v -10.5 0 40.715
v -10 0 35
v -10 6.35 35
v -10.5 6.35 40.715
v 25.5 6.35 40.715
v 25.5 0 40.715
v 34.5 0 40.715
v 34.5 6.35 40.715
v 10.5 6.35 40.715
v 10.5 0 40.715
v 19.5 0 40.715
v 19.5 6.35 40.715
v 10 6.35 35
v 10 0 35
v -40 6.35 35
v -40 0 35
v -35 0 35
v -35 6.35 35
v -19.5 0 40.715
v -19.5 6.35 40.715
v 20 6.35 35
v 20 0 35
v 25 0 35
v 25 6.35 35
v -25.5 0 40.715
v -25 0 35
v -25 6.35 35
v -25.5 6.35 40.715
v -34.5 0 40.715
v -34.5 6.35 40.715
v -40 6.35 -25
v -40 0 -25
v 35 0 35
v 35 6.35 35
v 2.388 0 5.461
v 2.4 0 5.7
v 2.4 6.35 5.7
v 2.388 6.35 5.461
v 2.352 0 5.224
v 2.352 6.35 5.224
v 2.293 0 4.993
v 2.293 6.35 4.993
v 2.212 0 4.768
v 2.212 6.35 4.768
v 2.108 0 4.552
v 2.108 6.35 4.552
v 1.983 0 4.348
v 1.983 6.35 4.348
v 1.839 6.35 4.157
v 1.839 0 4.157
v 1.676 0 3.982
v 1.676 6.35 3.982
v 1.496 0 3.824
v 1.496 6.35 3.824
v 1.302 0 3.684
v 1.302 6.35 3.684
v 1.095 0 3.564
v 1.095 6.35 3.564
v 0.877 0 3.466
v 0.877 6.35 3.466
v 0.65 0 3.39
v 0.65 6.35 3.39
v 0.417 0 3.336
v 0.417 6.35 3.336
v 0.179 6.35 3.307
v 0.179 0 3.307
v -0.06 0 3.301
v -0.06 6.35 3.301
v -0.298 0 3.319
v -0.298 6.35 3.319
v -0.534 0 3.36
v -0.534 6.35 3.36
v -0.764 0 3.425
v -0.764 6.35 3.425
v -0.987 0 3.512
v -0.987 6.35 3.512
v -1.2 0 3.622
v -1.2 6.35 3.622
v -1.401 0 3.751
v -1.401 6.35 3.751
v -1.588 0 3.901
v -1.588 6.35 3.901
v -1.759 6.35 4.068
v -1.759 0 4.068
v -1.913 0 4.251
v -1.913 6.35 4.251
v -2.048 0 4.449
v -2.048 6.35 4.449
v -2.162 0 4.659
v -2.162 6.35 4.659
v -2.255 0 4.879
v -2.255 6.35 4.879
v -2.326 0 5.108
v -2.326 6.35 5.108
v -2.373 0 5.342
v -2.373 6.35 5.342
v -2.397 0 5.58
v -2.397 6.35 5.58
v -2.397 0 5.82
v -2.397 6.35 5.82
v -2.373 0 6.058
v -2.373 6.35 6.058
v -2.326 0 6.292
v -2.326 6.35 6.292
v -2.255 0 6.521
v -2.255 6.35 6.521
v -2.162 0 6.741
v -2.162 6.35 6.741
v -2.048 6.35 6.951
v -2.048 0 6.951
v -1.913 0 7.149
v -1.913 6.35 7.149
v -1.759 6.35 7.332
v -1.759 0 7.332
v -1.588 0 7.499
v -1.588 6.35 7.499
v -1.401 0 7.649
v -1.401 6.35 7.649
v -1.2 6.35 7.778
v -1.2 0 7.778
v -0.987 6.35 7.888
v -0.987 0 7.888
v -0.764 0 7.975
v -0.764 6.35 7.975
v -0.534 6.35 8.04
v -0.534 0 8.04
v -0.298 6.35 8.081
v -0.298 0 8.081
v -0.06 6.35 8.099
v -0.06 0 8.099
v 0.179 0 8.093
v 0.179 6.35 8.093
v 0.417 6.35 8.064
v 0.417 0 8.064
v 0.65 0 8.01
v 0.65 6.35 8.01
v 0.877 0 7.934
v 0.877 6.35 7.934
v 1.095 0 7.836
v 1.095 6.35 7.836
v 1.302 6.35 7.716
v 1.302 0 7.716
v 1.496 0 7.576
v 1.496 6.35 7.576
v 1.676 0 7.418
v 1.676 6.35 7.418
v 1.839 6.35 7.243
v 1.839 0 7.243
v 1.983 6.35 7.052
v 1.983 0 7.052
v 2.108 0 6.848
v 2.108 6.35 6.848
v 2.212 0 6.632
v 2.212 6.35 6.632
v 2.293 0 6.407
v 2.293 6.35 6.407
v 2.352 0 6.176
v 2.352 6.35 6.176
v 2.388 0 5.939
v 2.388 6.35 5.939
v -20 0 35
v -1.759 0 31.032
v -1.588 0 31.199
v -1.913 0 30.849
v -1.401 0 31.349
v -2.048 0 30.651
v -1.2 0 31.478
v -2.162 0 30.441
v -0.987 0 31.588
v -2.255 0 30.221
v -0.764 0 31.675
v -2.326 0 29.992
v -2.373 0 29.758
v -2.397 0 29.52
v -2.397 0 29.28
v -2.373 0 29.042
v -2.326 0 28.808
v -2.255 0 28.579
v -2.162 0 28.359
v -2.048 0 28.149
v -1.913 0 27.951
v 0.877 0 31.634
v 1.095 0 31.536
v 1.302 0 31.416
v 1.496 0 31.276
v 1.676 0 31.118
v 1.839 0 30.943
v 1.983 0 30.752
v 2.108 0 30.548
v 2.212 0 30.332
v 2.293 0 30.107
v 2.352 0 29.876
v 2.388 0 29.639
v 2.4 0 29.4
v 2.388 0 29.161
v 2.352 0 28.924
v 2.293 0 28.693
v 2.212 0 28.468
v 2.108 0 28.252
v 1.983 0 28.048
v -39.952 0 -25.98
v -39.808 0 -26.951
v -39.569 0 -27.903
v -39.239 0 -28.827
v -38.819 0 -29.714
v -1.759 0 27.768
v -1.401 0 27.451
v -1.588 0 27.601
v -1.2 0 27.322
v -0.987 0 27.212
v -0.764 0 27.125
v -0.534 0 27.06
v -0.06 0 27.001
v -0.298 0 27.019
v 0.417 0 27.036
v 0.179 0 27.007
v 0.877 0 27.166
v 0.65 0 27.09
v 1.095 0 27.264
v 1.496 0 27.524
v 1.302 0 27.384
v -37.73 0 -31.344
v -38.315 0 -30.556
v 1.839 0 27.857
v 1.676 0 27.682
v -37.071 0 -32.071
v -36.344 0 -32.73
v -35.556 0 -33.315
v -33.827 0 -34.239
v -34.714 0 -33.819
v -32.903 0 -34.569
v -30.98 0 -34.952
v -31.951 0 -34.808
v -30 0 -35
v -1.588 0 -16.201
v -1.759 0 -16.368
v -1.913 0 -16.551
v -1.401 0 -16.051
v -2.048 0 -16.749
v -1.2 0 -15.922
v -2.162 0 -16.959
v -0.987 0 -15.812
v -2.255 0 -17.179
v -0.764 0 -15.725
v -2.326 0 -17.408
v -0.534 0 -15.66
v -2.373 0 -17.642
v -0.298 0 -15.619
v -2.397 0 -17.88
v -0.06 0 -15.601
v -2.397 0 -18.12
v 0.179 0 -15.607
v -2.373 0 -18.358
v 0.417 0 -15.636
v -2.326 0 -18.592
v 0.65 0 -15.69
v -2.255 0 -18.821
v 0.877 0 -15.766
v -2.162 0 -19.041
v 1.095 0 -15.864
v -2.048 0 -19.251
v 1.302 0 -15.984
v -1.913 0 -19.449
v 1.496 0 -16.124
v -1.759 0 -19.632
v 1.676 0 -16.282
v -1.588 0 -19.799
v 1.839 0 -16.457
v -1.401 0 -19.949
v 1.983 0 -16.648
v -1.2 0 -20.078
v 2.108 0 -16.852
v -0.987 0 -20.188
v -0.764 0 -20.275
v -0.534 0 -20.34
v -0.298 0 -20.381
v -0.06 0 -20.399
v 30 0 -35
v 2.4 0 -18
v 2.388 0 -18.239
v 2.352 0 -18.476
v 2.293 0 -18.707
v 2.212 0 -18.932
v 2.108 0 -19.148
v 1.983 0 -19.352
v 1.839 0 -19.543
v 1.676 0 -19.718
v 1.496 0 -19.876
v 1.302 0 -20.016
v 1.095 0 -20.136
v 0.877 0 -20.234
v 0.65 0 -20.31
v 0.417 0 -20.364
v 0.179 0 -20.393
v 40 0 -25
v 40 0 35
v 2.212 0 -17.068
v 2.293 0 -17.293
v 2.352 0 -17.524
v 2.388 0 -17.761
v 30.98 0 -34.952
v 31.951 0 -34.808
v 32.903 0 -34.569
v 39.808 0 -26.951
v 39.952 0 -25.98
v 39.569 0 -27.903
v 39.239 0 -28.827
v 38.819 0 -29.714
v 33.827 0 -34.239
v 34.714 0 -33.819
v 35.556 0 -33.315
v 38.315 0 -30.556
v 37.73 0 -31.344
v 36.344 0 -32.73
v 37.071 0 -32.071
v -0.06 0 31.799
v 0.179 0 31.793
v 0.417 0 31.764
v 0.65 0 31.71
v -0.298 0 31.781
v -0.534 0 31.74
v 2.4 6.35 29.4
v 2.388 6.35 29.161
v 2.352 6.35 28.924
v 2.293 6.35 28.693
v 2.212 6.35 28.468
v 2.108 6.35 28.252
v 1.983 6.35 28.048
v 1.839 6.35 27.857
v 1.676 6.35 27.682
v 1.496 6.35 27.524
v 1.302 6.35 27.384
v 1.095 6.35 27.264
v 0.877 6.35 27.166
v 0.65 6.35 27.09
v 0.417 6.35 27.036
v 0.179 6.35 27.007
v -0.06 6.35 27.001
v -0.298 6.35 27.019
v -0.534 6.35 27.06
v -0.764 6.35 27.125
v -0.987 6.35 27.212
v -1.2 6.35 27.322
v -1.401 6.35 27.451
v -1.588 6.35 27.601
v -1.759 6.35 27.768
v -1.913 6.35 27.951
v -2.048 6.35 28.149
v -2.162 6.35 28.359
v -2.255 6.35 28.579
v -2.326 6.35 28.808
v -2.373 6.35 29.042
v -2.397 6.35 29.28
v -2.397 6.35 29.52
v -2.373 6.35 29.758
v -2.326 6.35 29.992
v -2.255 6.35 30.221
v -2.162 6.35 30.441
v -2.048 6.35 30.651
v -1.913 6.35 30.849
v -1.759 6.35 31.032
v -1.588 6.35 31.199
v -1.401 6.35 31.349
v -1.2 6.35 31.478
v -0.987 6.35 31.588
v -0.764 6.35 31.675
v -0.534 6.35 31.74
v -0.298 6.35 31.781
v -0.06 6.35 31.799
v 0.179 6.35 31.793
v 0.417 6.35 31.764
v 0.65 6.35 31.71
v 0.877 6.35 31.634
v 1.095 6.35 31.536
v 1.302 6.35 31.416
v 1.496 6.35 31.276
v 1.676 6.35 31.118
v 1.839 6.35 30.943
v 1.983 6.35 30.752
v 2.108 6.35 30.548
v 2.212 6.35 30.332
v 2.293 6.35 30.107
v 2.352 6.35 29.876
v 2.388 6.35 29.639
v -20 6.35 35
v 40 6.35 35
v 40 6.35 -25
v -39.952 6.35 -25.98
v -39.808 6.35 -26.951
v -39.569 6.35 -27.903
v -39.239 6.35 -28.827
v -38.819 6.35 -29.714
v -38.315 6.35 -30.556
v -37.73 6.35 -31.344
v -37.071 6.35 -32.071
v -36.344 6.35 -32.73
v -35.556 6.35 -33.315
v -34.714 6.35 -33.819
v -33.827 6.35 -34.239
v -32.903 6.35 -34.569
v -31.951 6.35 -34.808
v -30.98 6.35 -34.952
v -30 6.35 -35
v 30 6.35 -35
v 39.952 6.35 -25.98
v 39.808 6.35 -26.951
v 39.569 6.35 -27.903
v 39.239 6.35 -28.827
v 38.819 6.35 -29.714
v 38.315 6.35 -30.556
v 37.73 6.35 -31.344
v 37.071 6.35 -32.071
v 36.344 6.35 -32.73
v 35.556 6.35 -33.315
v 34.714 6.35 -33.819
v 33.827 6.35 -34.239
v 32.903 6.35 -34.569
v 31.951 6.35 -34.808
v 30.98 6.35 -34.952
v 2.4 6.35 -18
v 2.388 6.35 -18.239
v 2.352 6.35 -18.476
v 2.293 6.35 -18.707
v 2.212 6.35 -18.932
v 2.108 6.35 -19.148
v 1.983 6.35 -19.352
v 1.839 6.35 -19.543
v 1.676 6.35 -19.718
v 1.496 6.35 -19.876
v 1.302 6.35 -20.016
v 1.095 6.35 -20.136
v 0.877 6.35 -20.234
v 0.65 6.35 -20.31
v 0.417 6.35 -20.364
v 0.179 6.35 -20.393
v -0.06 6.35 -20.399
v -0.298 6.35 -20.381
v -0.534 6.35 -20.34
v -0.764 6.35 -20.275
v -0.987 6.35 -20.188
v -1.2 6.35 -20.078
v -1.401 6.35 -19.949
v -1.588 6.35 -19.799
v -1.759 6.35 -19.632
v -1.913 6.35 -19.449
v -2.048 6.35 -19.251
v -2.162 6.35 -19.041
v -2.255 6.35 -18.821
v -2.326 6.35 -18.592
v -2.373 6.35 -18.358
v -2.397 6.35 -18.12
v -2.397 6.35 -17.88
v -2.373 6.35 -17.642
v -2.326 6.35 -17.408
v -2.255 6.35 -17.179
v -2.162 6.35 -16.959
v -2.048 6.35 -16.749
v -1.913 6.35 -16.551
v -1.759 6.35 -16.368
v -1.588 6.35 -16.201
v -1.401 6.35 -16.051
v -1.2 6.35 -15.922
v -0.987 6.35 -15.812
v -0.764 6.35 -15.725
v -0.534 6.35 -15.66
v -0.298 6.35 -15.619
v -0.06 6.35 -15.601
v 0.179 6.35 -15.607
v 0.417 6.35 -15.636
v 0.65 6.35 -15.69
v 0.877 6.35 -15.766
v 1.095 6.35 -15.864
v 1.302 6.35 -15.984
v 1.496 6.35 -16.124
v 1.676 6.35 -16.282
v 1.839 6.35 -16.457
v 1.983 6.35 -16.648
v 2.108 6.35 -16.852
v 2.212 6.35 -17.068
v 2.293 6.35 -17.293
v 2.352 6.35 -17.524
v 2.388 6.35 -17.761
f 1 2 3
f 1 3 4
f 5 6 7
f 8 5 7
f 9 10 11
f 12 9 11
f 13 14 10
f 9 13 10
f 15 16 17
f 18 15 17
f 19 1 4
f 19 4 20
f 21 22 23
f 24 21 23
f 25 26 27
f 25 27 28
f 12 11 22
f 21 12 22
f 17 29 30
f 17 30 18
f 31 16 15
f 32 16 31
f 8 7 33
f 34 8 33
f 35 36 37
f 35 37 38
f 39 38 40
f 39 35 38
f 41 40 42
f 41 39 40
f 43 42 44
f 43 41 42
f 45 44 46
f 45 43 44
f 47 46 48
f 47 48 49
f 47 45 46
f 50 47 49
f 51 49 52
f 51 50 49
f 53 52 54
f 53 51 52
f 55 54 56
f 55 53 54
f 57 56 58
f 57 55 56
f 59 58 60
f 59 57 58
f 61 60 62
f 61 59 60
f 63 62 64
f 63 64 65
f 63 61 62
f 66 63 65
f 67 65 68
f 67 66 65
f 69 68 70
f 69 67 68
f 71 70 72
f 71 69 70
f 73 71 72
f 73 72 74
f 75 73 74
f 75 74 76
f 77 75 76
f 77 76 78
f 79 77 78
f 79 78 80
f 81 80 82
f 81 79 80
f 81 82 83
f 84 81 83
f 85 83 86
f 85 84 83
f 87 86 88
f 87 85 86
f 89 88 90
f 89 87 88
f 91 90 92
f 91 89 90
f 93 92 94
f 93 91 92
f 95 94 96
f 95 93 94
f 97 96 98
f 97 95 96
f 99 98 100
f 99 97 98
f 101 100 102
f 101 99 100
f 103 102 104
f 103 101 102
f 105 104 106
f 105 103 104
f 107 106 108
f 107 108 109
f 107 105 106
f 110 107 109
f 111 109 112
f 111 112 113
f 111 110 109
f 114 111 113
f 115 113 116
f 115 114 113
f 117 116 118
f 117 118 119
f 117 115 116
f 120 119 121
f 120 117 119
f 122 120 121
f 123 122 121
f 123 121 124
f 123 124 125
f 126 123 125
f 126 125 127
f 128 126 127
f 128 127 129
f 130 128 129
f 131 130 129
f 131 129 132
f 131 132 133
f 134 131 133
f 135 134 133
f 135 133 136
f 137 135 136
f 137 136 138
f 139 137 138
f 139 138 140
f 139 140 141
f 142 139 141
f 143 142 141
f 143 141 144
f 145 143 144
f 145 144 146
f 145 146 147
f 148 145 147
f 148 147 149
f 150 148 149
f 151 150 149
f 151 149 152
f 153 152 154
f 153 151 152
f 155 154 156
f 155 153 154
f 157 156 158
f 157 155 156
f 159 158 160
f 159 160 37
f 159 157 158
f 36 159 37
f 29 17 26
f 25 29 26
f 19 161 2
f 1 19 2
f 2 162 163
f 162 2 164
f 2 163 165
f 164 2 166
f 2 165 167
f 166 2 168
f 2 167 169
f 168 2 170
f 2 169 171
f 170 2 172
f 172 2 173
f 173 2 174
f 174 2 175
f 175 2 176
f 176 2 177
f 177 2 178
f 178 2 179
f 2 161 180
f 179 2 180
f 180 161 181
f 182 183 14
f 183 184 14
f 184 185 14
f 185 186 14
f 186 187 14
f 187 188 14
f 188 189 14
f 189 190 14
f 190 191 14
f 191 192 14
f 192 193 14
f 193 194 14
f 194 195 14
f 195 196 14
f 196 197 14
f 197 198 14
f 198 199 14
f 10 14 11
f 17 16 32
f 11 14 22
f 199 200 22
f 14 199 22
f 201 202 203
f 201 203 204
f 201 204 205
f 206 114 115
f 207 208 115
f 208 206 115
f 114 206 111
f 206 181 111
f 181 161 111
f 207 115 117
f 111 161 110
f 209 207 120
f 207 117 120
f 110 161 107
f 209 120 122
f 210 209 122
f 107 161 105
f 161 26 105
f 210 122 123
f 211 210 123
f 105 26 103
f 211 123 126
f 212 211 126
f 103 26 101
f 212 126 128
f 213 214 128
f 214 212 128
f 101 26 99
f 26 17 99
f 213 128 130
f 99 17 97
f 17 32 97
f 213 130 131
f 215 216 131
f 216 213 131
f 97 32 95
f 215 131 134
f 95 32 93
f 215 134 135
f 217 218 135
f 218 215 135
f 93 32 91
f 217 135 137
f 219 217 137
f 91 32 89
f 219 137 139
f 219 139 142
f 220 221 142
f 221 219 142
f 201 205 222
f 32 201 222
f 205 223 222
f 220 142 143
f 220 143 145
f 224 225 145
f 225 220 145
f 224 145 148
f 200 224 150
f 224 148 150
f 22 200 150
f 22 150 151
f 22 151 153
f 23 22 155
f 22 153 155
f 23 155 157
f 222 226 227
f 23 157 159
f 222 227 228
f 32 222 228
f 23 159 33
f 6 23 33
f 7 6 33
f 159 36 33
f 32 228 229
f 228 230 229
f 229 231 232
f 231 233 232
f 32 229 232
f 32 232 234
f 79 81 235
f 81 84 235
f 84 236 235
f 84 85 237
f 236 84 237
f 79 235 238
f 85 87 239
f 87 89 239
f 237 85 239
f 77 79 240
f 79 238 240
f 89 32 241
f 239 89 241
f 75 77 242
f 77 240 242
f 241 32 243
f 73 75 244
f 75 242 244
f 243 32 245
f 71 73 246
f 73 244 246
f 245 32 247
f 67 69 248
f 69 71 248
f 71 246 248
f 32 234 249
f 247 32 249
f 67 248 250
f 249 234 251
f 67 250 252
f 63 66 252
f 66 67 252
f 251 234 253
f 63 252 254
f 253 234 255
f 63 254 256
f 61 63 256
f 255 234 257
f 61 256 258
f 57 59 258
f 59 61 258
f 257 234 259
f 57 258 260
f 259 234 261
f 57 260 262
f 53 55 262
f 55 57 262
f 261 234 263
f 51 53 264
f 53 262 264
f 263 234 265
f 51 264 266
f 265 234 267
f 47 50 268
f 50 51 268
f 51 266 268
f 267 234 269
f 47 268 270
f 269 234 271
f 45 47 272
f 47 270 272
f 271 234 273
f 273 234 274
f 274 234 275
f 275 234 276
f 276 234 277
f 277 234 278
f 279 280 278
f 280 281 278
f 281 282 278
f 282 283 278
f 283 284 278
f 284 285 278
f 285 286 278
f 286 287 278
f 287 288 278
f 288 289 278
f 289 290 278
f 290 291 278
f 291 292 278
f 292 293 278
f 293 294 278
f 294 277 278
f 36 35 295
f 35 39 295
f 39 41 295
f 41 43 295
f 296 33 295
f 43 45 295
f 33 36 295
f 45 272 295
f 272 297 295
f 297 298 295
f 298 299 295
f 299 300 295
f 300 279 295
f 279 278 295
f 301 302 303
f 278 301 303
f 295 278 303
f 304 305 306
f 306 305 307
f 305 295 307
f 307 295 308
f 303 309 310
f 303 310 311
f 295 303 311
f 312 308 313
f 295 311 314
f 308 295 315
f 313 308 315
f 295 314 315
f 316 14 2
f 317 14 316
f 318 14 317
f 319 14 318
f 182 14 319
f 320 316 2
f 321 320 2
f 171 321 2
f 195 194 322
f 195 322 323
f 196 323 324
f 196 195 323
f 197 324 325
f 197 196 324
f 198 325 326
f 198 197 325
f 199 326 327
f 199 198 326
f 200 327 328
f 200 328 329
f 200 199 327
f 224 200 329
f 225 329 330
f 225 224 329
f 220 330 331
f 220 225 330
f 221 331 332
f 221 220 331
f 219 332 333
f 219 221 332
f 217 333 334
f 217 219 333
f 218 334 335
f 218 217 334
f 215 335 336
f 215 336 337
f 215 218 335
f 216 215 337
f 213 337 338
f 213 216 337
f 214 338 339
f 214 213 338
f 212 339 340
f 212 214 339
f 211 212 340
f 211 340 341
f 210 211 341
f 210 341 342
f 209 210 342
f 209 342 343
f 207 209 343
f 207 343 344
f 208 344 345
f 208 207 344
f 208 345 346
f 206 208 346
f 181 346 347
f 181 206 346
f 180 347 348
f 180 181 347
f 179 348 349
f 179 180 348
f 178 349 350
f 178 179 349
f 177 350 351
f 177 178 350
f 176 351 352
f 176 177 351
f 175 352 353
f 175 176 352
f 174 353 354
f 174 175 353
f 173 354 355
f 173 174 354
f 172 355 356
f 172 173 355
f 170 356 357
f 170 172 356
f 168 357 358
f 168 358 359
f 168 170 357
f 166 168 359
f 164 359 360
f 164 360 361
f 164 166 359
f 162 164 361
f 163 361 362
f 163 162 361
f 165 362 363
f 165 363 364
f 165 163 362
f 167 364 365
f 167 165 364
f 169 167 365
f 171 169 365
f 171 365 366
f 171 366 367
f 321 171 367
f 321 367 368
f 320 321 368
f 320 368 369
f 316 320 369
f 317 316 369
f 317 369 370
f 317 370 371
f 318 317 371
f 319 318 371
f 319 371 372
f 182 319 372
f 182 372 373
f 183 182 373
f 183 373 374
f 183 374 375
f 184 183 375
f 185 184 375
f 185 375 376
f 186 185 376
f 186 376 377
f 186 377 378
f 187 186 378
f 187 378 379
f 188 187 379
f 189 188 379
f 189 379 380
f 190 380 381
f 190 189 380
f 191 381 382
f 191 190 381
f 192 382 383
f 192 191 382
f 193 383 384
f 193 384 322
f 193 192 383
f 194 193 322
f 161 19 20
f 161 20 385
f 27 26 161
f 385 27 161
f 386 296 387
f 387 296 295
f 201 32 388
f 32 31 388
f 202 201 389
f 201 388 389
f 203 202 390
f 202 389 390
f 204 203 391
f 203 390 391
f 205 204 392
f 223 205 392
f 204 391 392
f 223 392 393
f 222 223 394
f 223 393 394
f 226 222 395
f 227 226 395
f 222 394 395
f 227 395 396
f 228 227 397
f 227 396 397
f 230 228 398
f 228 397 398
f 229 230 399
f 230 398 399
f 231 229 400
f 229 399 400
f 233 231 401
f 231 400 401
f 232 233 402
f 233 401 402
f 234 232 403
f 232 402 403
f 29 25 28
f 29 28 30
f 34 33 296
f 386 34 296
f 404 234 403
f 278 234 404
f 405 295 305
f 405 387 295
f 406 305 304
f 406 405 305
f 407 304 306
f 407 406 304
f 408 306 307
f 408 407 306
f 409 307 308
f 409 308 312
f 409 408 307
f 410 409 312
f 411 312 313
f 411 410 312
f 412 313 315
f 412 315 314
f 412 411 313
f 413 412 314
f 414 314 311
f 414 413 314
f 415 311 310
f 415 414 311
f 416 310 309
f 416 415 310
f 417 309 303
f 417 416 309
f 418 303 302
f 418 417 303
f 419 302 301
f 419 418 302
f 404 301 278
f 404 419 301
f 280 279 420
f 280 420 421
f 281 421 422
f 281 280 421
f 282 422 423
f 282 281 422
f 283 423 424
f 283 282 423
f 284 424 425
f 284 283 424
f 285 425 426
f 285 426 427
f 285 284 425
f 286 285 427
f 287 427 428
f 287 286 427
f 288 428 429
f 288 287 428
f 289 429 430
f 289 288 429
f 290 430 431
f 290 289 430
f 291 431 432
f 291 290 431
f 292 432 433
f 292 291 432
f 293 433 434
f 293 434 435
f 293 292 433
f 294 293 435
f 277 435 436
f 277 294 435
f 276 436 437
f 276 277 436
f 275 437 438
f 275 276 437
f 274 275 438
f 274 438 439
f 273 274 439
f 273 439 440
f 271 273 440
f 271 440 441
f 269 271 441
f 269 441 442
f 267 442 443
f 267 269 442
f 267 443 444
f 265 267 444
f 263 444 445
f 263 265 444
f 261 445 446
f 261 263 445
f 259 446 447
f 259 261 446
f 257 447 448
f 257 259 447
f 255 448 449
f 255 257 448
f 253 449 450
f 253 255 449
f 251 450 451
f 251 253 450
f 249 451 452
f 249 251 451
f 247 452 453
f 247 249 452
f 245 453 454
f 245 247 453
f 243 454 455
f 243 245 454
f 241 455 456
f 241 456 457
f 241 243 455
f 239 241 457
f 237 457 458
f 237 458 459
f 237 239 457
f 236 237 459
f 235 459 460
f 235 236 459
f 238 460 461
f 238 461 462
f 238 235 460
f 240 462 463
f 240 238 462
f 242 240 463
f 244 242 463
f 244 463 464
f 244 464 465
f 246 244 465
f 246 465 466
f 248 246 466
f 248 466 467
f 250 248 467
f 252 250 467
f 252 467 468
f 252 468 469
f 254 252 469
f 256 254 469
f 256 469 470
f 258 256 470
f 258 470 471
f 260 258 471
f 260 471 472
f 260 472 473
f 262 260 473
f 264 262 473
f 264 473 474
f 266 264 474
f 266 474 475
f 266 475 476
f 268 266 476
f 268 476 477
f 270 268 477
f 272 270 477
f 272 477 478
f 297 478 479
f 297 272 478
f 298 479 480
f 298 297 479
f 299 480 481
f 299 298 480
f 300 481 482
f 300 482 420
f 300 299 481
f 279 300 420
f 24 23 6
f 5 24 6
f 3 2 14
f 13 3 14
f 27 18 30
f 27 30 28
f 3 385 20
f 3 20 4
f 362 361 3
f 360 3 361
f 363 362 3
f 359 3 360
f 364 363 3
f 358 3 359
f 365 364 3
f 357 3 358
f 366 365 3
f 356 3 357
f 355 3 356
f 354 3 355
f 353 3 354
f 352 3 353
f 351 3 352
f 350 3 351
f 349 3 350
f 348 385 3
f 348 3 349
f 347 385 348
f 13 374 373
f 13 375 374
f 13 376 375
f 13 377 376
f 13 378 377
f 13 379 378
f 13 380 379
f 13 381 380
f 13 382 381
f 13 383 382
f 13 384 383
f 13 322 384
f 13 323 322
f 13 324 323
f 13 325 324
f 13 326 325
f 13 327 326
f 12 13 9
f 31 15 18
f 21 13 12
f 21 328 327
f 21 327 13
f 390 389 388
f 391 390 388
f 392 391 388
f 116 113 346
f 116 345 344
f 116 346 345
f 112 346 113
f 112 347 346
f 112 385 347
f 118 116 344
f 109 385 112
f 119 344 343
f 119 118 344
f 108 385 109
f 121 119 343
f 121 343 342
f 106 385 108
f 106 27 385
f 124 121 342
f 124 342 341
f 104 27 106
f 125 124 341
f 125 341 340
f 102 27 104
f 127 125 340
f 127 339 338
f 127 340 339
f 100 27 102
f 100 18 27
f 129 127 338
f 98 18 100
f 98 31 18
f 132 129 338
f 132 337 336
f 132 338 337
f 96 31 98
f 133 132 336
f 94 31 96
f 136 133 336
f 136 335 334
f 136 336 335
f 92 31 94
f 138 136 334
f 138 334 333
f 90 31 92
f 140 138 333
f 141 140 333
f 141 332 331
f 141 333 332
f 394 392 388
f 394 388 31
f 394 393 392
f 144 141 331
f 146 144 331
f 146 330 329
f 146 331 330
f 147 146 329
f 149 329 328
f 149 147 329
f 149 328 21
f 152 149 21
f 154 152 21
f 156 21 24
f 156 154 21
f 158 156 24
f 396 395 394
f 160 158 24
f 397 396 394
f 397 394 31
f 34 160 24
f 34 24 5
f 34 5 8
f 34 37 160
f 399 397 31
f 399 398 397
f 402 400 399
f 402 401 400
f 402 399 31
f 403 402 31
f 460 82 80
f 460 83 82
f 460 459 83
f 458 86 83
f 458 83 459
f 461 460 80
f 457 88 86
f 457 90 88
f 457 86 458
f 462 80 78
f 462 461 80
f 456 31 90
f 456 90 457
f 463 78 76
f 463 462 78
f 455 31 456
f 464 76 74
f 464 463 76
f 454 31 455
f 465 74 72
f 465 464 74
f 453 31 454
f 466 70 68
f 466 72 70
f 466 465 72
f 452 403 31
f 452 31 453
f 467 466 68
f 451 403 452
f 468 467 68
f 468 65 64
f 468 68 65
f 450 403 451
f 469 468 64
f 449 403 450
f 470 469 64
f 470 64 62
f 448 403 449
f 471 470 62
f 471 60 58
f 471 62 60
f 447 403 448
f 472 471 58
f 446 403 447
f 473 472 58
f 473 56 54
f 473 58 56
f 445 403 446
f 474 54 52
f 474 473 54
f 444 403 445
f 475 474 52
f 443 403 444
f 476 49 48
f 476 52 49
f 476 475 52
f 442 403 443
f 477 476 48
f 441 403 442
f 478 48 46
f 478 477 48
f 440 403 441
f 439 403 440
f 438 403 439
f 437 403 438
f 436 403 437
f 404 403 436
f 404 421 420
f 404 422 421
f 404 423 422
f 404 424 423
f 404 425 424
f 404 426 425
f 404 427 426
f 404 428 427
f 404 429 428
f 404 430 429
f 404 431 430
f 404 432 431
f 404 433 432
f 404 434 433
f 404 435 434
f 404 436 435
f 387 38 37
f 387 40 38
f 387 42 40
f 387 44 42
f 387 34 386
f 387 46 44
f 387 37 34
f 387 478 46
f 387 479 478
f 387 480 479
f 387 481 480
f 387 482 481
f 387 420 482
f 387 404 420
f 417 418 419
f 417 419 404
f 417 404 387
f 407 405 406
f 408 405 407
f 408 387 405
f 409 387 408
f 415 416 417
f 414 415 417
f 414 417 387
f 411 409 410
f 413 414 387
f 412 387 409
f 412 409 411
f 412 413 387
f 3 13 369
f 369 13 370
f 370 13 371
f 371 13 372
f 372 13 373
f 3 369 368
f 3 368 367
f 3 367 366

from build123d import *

# Parameters (mm, degrees)
SKETCH1_W           = 80
SKETCH1_H           = 70
SKETCH1_R           = 2.4
BOSS_EXTRUDE1_DEPTH = 6.35
FILLET1_R           = 10


with BuildPart() as part:
    # Sketch1 → Boss-Extrude1 (new body)
    with BuildSketch(Plane(origin=(0, 0, 0), x_dir=(1, 0, 0), z_dir=(0, 1, 0))):
        Rectangle(SKETCH1_W, SKETCH1_H)
        with Locations((0, 18)):
            Circle(SKETCH1_R, mode=Mode.SUBTRACT)
        with Locations((0, -5.7)):
            Circle(SKETCH1_R, mode=Mode.SUBTRACT)
        with Locations((0, -29.4)):
            Circle(SKETCH1_R, mode=Mode.SUBTRACT)
        Polygon((-20, -35), (-10, -35), (-10.5, -40.715), (-19.5, -40.715), align=None)
        Polygon((10, -35), (10.5, -40.715), (19.5, -40.715), (20, -35), align=None)
        Polygon((-35, -35), (-25, -35), (-25.5, -40.715), (-34.5, -40.715), align=None)
        Polygon((25, -35), (25.5, -40.715), (34.5, -40.715), (35, -35), align=None)
    extrude(amount=BOSS_EXTRUDE1_DEPTH)

    # Fillet1
    fillet1_edges = [part.edges().sort_by_distance(p)[0] for p in [
        (-40, 3.175, -35),
        (40, 3.175, -35),
    ]]
    fillet(fillet1_edges, radius=FILLET1_R)


solid = part.part
